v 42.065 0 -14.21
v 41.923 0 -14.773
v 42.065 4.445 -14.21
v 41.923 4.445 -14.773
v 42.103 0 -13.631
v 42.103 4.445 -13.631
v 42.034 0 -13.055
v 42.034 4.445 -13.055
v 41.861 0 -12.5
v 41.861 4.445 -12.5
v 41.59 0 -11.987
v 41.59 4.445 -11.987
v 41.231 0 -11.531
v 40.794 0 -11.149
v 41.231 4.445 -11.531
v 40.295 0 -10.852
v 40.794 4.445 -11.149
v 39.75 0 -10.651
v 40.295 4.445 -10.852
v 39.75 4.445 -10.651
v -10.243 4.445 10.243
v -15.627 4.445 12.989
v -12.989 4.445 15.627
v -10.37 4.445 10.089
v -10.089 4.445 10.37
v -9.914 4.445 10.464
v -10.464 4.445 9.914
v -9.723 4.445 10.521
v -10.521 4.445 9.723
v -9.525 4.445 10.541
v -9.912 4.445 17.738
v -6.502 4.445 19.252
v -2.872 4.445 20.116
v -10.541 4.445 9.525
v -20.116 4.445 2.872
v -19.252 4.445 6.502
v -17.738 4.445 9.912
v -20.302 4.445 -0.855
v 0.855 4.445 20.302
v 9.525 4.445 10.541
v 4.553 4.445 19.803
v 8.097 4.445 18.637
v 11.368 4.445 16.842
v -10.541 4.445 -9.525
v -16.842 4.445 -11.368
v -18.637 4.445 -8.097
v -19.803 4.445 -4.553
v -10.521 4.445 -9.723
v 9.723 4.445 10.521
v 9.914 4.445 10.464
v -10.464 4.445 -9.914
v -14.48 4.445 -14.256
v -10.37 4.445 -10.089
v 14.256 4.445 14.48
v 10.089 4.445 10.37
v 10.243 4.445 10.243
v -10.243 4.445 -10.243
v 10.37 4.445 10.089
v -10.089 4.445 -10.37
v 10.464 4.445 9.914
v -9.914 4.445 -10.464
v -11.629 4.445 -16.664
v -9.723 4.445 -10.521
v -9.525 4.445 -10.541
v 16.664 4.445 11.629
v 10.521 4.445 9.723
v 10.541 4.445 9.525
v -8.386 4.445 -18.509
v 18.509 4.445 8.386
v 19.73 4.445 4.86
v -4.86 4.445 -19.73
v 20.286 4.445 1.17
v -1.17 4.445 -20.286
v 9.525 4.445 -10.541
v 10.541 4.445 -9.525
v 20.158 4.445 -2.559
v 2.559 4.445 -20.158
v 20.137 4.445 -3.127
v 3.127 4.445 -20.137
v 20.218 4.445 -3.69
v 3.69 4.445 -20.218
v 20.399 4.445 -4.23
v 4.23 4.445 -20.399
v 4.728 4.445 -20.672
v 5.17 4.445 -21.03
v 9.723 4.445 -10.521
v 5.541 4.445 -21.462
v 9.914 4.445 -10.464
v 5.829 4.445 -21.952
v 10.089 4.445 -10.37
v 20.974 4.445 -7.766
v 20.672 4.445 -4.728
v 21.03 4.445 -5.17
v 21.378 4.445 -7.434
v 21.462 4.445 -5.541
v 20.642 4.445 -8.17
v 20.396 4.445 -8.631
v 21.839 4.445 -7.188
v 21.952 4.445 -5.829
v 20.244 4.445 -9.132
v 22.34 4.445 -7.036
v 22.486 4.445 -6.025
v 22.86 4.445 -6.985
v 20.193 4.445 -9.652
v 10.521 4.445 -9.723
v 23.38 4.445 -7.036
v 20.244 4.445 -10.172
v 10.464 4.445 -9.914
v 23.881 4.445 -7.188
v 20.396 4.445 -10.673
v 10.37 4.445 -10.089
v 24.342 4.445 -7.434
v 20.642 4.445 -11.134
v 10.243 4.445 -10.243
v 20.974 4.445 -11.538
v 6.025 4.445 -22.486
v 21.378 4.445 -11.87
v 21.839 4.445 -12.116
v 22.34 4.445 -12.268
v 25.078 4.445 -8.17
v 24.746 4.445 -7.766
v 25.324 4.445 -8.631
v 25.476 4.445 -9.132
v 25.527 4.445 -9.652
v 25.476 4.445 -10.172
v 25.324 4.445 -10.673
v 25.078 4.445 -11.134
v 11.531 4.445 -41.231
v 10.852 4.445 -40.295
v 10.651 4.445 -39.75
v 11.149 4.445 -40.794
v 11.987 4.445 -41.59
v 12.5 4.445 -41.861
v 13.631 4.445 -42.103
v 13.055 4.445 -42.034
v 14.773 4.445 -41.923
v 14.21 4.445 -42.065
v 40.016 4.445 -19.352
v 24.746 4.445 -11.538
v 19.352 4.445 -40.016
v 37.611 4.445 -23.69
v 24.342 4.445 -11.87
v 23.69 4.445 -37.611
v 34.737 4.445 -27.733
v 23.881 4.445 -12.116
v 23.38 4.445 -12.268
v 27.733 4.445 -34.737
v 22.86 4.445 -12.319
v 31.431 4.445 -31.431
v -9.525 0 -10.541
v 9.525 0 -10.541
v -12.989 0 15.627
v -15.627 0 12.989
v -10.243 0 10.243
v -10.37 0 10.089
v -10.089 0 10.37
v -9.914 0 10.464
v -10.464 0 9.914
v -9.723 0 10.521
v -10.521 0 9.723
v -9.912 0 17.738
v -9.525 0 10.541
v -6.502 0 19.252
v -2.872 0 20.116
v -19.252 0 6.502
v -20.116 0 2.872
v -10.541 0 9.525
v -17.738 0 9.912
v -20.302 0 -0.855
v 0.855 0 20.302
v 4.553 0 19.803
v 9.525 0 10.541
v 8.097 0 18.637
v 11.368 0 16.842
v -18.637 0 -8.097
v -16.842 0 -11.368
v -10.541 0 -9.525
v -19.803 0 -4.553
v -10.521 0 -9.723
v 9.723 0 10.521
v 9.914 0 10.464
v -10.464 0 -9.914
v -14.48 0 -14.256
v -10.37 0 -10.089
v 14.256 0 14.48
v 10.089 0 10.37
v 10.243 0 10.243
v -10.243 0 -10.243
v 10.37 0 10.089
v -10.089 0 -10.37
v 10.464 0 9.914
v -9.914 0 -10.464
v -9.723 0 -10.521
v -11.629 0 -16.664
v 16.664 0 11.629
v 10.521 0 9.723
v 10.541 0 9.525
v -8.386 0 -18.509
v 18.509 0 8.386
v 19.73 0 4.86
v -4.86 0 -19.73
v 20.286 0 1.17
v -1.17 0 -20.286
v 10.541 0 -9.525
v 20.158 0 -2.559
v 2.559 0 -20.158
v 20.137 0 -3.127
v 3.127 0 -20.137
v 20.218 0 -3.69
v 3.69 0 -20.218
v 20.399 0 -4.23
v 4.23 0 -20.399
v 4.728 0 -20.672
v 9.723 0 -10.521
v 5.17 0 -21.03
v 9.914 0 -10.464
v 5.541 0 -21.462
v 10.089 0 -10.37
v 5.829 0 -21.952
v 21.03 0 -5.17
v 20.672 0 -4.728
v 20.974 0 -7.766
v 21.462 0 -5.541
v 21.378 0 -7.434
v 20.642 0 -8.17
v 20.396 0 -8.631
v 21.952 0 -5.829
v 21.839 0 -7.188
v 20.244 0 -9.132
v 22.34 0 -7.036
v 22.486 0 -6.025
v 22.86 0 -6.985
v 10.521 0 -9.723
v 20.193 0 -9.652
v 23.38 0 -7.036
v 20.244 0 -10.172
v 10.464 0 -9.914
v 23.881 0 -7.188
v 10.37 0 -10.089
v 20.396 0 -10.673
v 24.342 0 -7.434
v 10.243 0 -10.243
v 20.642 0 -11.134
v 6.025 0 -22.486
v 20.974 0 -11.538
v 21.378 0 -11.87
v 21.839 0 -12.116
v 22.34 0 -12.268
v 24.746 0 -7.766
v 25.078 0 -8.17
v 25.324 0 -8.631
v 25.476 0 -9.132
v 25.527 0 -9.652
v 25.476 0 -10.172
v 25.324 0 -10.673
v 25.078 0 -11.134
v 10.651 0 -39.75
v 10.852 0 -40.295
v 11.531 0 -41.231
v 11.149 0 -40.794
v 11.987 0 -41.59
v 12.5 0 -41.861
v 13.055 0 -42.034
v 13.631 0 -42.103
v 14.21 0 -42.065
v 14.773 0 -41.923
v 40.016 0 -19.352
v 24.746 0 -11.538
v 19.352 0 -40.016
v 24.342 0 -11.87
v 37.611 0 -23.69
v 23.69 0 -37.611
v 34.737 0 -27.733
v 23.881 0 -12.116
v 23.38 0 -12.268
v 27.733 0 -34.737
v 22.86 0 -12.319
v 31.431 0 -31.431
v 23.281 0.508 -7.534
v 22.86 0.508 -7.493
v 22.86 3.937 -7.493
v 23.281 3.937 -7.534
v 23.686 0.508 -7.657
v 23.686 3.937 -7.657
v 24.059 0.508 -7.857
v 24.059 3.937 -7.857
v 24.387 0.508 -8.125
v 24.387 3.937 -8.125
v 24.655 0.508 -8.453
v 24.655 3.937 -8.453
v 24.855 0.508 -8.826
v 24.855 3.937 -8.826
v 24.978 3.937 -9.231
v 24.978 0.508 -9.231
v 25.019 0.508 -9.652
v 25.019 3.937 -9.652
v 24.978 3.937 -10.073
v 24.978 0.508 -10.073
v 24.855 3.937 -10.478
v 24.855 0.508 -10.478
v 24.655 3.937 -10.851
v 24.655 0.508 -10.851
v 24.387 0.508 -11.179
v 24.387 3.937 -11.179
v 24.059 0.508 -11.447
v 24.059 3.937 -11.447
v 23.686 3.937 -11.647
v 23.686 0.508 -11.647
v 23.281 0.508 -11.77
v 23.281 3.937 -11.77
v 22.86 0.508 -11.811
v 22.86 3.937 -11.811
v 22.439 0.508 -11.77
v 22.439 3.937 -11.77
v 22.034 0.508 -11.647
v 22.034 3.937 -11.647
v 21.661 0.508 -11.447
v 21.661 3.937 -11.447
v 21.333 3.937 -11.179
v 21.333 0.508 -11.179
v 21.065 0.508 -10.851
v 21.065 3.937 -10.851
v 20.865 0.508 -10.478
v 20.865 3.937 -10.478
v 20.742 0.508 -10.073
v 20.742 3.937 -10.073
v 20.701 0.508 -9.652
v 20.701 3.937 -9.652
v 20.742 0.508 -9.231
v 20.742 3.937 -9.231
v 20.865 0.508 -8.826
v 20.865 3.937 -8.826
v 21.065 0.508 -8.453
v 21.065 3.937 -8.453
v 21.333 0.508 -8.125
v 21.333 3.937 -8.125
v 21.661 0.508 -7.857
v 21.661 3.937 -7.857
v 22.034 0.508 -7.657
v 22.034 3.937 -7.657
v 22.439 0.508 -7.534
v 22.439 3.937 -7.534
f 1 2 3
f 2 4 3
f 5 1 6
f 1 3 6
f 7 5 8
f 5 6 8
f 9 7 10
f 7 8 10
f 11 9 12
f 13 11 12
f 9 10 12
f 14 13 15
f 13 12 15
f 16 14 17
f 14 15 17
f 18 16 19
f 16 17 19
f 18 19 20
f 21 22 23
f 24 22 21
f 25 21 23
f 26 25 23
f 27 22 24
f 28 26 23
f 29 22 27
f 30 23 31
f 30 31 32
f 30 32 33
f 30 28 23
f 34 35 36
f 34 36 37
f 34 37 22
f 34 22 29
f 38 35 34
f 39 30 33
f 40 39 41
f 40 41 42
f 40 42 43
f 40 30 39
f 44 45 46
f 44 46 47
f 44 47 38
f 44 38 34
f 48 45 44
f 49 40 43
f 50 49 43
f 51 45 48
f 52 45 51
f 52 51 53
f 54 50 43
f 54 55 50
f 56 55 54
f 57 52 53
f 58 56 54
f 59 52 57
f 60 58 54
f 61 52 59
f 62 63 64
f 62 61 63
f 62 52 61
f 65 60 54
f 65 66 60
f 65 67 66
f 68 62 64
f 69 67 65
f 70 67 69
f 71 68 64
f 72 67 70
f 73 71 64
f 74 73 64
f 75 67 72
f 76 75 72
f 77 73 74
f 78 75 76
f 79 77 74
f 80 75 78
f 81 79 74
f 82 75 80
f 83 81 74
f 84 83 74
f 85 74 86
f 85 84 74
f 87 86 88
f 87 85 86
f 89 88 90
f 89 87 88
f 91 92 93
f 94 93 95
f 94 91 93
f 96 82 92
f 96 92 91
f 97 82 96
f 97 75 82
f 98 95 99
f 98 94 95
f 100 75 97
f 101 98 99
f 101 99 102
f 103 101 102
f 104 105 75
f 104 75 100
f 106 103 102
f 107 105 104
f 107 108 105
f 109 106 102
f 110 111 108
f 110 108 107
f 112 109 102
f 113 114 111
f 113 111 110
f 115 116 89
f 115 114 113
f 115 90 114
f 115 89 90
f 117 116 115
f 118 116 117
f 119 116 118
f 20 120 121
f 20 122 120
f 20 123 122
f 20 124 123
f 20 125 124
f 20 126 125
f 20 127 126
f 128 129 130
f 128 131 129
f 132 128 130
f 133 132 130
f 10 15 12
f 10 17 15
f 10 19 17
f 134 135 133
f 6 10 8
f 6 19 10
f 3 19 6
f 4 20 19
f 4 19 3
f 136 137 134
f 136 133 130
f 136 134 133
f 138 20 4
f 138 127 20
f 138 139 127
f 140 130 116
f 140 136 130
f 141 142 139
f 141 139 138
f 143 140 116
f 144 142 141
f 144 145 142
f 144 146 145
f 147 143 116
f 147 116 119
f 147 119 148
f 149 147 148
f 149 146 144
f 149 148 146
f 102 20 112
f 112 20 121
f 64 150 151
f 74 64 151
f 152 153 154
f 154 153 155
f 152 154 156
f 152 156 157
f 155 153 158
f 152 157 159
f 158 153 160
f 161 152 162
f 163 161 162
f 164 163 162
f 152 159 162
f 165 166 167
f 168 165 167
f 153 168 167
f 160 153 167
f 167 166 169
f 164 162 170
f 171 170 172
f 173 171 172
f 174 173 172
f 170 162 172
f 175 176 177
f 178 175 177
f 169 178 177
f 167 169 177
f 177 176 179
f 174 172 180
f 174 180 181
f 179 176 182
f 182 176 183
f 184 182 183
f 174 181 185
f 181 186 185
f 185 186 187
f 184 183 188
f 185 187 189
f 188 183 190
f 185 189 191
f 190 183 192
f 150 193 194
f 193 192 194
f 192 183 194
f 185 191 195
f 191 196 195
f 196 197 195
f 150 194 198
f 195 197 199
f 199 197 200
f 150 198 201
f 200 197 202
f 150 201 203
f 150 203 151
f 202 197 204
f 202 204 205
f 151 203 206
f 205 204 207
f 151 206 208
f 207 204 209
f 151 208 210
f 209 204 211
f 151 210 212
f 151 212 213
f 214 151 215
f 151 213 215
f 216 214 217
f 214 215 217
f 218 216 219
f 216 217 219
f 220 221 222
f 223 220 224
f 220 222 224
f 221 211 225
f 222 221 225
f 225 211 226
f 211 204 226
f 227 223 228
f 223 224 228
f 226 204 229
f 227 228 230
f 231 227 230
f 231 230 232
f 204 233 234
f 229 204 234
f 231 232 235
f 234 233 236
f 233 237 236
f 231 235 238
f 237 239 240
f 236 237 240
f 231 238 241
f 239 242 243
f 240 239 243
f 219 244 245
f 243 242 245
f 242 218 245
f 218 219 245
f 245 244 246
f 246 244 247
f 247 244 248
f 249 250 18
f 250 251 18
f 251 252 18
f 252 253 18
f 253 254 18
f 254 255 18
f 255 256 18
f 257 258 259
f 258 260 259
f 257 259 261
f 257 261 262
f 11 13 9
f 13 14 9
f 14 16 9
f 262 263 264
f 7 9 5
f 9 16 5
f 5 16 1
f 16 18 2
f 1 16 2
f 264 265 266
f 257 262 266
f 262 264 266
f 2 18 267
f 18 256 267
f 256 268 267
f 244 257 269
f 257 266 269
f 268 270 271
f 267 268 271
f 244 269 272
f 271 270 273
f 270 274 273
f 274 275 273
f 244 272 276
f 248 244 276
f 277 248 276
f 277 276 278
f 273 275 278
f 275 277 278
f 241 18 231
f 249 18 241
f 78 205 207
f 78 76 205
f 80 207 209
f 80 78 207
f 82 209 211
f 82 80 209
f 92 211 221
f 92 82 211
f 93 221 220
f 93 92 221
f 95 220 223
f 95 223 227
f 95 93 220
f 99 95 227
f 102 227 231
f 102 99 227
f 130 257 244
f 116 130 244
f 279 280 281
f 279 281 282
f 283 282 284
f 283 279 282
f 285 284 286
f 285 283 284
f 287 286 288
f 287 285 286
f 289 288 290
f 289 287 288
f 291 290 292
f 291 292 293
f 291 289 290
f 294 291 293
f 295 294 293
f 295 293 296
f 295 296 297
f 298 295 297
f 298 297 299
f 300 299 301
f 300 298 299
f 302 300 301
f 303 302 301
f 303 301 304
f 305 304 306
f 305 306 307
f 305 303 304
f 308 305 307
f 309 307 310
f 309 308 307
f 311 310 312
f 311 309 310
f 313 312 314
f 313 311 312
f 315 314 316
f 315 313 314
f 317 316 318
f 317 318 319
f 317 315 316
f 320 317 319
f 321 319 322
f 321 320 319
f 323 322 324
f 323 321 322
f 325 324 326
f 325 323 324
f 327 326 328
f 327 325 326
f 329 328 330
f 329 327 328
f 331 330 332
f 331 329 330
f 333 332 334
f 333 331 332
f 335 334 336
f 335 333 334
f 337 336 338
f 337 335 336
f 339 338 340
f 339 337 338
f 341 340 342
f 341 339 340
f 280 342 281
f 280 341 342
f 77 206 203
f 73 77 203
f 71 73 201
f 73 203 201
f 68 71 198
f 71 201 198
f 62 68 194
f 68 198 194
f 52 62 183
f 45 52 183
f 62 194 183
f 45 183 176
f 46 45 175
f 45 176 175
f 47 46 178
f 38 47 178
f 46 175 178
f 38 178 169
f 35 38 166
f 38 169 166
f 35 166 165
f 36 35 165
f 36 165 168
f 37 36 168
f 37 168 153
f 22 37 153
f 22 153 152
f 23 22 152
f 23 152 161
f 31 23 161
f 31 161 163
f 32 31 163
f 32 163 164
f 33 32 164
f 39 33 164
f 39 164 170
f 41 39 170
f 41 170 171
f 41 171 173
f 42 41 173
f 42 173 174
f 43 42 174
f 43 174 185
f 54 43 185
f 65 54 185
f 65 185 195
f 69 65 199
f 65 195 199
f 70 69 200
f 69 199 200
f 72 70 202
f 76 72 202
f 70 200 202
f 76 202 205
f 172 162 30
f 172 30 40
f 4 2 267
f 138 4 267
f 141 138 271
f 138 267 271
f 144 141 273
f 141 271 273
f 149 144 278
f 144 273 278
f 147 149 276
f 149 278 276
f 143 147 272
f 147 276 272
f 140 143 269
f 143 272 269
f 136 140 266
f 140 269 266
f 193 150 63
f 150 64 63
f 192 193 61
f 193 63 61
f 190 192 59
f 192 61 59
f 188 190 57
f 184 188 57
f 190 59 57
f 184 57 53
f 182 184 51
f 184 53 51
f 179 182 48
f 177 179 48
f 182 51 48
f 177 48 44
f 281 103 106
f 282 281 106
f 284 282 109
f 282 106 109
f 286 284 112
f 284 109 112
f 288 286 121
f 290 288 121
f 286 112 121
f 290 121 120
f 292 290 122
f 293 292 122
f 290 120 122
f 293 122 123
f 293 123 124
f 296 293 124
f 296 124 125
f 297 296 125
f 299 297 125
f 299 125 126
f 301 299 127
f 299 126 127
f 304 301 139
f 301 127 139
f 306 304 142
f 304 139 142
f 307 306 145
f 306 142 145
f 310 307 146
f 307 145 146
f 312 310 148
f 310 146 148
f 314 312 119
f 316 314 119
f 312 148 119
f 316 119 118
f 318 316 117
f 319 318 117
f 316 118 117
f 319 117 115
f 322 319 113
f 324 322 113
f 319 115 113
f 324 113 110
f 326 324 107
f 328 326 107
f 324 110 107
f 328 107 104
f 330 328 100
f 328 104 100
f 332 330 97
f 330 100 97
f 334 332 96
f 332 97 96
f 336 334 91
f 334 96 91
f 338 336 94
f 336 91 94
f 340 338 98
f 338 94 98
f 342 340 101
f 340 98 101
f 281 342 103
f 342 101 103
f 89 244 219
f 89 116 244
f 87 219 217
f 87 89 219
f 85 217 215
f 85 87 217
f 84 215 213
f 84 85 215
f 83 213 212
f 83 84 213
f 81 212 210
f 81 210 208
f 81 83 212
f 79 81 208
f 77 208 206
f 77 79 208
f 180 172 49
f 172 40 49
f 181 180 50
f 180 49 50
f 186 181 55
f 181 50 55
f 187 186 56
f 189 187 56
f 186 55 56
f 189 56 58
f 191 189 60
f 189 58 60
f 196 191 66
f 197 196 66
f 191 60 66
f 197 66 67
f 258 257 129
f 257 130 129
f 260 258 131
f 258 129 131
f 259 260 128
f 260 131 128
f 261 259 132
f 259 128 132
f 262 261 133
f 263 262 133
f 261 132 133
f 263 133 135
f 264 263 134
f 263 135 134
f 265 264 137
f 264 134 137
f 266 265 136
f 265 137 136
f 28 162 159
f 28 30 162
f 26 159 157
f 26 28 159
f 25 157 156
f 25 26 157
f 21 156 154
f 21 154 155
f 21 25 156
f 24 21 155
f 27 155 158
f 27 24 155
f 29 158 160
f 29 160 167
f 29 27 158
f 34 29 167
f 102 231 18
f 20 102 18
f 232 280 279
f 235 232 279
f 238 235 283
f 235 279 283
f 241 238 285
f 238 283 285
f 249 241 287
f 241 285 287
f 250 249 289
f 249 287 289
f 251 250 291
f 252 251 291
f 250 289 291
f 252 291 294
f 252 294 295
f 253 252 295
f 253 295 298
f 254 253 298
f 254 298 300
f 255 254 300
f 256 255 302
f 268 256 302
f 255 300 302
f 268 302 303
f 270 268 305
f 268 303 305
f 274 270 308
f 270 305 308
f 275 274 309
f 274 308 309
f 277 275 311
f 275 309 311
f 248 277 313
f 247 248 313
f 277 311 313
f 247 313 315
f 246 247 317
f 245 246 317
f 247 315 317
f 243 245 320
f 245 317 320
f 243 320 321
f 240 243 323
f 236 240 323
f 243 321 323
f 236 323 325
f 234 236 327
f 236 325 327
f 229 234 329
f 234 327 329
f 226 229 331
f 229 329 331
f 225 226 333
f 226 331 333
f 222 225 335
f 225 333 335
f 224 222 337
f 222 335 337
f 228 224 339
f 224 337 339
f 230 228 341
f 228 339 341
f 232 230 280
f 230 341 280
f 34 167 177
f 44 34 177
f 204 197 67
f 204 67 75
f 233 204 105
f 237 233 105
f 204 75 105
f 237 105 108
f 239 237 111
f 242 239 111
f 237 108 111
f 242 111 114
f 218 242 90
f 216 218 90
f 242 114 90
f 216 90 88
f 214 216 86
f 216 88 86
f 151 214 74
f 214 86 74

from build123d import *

# Parameters (mm, degrees)
CROQUIS1_R              = 2.159
CROQUIS1_W              = 21.082
CROQUIS1_H              = 21.082
SALIENTE_EXTRUIR1_DEPTH = 4.445
REDONDEO1_R             = 3.175
REDONDEO2_R             = 1.016
CHAFL_N1_SIZE           = 0.508


with BuildPart() as part:
    # Croquis1 → Saliente-Extruir1 (new body)
    with BuildSketch(Plane(origin=(0, 0, 0), x_dir=(1, 0, 0), z_dir=(0, 1, 0))):
        with BuildLine():
            Line((11.504506555, 42.935402979), (5.259202996, 19.62761279))
            ThreePointArc((5.259202996, 19.62761279), (-14.368409794, -14.368409794), (19.62761279, 5.259202996))
            Line((19.62761279, 5.259202996), (42.935402979, 11.504506555))
            ThreePointArc((42.935402979, 11.504506555), (31.430896424, 31.430896424), (11.504506555, 42.935402979))
        make_face()
        with Locations(Location((22.86, 9.652, 0), (0, 0, 270))):
            Circle(CROQUIS1_R, mode=Mode.SUBTRACT)
        Rectangle(CROQUIS1_W, CROQUIS1_H, mode=Mode.SUBTRACT)
    extrude(amount=SALIENTE_EXTRUIR1_DEPTH)

    # Redondeo1
    redondeo1_edges = [part.edges().sort_by_distance(p)[0] for p in [
        (42.935402979, 2.2225, -11.504506555),
        (19.62761279, 2.2225, -5.259202996),
        (5.259202996, 2.2225, -19.62761279),
        (11.504506555, 2.2225, -42.935402979),
    ]]
    fillet(redondeo1_edges, radius=REDONDEO1_R)

    # Redondeo2
    redondeo2_edges = [part.edges().sort_by_distance(p)[0] for p in [
        (10.541, 2.2225, 10.541),
        (10.541, 2.2225, -10.541),
        (-10.541, 2.2225, -10.541),
        (-10.541, 2.2225, 10.541),
    ]]
    fillet(redondeo2_edges, radius=REDONDEO2_R)

    # Chaflán1
    chafl_n1_edges = [part.edges().sort_by_distance(p)[0] for p in [
        (22.86, 0, -11.811),
        (22.86, 4.445, -11.811),
    ]]
    chamfer(chafl_n1_edges, length=CHAFL_N1_SIZE)


solid = part.part
